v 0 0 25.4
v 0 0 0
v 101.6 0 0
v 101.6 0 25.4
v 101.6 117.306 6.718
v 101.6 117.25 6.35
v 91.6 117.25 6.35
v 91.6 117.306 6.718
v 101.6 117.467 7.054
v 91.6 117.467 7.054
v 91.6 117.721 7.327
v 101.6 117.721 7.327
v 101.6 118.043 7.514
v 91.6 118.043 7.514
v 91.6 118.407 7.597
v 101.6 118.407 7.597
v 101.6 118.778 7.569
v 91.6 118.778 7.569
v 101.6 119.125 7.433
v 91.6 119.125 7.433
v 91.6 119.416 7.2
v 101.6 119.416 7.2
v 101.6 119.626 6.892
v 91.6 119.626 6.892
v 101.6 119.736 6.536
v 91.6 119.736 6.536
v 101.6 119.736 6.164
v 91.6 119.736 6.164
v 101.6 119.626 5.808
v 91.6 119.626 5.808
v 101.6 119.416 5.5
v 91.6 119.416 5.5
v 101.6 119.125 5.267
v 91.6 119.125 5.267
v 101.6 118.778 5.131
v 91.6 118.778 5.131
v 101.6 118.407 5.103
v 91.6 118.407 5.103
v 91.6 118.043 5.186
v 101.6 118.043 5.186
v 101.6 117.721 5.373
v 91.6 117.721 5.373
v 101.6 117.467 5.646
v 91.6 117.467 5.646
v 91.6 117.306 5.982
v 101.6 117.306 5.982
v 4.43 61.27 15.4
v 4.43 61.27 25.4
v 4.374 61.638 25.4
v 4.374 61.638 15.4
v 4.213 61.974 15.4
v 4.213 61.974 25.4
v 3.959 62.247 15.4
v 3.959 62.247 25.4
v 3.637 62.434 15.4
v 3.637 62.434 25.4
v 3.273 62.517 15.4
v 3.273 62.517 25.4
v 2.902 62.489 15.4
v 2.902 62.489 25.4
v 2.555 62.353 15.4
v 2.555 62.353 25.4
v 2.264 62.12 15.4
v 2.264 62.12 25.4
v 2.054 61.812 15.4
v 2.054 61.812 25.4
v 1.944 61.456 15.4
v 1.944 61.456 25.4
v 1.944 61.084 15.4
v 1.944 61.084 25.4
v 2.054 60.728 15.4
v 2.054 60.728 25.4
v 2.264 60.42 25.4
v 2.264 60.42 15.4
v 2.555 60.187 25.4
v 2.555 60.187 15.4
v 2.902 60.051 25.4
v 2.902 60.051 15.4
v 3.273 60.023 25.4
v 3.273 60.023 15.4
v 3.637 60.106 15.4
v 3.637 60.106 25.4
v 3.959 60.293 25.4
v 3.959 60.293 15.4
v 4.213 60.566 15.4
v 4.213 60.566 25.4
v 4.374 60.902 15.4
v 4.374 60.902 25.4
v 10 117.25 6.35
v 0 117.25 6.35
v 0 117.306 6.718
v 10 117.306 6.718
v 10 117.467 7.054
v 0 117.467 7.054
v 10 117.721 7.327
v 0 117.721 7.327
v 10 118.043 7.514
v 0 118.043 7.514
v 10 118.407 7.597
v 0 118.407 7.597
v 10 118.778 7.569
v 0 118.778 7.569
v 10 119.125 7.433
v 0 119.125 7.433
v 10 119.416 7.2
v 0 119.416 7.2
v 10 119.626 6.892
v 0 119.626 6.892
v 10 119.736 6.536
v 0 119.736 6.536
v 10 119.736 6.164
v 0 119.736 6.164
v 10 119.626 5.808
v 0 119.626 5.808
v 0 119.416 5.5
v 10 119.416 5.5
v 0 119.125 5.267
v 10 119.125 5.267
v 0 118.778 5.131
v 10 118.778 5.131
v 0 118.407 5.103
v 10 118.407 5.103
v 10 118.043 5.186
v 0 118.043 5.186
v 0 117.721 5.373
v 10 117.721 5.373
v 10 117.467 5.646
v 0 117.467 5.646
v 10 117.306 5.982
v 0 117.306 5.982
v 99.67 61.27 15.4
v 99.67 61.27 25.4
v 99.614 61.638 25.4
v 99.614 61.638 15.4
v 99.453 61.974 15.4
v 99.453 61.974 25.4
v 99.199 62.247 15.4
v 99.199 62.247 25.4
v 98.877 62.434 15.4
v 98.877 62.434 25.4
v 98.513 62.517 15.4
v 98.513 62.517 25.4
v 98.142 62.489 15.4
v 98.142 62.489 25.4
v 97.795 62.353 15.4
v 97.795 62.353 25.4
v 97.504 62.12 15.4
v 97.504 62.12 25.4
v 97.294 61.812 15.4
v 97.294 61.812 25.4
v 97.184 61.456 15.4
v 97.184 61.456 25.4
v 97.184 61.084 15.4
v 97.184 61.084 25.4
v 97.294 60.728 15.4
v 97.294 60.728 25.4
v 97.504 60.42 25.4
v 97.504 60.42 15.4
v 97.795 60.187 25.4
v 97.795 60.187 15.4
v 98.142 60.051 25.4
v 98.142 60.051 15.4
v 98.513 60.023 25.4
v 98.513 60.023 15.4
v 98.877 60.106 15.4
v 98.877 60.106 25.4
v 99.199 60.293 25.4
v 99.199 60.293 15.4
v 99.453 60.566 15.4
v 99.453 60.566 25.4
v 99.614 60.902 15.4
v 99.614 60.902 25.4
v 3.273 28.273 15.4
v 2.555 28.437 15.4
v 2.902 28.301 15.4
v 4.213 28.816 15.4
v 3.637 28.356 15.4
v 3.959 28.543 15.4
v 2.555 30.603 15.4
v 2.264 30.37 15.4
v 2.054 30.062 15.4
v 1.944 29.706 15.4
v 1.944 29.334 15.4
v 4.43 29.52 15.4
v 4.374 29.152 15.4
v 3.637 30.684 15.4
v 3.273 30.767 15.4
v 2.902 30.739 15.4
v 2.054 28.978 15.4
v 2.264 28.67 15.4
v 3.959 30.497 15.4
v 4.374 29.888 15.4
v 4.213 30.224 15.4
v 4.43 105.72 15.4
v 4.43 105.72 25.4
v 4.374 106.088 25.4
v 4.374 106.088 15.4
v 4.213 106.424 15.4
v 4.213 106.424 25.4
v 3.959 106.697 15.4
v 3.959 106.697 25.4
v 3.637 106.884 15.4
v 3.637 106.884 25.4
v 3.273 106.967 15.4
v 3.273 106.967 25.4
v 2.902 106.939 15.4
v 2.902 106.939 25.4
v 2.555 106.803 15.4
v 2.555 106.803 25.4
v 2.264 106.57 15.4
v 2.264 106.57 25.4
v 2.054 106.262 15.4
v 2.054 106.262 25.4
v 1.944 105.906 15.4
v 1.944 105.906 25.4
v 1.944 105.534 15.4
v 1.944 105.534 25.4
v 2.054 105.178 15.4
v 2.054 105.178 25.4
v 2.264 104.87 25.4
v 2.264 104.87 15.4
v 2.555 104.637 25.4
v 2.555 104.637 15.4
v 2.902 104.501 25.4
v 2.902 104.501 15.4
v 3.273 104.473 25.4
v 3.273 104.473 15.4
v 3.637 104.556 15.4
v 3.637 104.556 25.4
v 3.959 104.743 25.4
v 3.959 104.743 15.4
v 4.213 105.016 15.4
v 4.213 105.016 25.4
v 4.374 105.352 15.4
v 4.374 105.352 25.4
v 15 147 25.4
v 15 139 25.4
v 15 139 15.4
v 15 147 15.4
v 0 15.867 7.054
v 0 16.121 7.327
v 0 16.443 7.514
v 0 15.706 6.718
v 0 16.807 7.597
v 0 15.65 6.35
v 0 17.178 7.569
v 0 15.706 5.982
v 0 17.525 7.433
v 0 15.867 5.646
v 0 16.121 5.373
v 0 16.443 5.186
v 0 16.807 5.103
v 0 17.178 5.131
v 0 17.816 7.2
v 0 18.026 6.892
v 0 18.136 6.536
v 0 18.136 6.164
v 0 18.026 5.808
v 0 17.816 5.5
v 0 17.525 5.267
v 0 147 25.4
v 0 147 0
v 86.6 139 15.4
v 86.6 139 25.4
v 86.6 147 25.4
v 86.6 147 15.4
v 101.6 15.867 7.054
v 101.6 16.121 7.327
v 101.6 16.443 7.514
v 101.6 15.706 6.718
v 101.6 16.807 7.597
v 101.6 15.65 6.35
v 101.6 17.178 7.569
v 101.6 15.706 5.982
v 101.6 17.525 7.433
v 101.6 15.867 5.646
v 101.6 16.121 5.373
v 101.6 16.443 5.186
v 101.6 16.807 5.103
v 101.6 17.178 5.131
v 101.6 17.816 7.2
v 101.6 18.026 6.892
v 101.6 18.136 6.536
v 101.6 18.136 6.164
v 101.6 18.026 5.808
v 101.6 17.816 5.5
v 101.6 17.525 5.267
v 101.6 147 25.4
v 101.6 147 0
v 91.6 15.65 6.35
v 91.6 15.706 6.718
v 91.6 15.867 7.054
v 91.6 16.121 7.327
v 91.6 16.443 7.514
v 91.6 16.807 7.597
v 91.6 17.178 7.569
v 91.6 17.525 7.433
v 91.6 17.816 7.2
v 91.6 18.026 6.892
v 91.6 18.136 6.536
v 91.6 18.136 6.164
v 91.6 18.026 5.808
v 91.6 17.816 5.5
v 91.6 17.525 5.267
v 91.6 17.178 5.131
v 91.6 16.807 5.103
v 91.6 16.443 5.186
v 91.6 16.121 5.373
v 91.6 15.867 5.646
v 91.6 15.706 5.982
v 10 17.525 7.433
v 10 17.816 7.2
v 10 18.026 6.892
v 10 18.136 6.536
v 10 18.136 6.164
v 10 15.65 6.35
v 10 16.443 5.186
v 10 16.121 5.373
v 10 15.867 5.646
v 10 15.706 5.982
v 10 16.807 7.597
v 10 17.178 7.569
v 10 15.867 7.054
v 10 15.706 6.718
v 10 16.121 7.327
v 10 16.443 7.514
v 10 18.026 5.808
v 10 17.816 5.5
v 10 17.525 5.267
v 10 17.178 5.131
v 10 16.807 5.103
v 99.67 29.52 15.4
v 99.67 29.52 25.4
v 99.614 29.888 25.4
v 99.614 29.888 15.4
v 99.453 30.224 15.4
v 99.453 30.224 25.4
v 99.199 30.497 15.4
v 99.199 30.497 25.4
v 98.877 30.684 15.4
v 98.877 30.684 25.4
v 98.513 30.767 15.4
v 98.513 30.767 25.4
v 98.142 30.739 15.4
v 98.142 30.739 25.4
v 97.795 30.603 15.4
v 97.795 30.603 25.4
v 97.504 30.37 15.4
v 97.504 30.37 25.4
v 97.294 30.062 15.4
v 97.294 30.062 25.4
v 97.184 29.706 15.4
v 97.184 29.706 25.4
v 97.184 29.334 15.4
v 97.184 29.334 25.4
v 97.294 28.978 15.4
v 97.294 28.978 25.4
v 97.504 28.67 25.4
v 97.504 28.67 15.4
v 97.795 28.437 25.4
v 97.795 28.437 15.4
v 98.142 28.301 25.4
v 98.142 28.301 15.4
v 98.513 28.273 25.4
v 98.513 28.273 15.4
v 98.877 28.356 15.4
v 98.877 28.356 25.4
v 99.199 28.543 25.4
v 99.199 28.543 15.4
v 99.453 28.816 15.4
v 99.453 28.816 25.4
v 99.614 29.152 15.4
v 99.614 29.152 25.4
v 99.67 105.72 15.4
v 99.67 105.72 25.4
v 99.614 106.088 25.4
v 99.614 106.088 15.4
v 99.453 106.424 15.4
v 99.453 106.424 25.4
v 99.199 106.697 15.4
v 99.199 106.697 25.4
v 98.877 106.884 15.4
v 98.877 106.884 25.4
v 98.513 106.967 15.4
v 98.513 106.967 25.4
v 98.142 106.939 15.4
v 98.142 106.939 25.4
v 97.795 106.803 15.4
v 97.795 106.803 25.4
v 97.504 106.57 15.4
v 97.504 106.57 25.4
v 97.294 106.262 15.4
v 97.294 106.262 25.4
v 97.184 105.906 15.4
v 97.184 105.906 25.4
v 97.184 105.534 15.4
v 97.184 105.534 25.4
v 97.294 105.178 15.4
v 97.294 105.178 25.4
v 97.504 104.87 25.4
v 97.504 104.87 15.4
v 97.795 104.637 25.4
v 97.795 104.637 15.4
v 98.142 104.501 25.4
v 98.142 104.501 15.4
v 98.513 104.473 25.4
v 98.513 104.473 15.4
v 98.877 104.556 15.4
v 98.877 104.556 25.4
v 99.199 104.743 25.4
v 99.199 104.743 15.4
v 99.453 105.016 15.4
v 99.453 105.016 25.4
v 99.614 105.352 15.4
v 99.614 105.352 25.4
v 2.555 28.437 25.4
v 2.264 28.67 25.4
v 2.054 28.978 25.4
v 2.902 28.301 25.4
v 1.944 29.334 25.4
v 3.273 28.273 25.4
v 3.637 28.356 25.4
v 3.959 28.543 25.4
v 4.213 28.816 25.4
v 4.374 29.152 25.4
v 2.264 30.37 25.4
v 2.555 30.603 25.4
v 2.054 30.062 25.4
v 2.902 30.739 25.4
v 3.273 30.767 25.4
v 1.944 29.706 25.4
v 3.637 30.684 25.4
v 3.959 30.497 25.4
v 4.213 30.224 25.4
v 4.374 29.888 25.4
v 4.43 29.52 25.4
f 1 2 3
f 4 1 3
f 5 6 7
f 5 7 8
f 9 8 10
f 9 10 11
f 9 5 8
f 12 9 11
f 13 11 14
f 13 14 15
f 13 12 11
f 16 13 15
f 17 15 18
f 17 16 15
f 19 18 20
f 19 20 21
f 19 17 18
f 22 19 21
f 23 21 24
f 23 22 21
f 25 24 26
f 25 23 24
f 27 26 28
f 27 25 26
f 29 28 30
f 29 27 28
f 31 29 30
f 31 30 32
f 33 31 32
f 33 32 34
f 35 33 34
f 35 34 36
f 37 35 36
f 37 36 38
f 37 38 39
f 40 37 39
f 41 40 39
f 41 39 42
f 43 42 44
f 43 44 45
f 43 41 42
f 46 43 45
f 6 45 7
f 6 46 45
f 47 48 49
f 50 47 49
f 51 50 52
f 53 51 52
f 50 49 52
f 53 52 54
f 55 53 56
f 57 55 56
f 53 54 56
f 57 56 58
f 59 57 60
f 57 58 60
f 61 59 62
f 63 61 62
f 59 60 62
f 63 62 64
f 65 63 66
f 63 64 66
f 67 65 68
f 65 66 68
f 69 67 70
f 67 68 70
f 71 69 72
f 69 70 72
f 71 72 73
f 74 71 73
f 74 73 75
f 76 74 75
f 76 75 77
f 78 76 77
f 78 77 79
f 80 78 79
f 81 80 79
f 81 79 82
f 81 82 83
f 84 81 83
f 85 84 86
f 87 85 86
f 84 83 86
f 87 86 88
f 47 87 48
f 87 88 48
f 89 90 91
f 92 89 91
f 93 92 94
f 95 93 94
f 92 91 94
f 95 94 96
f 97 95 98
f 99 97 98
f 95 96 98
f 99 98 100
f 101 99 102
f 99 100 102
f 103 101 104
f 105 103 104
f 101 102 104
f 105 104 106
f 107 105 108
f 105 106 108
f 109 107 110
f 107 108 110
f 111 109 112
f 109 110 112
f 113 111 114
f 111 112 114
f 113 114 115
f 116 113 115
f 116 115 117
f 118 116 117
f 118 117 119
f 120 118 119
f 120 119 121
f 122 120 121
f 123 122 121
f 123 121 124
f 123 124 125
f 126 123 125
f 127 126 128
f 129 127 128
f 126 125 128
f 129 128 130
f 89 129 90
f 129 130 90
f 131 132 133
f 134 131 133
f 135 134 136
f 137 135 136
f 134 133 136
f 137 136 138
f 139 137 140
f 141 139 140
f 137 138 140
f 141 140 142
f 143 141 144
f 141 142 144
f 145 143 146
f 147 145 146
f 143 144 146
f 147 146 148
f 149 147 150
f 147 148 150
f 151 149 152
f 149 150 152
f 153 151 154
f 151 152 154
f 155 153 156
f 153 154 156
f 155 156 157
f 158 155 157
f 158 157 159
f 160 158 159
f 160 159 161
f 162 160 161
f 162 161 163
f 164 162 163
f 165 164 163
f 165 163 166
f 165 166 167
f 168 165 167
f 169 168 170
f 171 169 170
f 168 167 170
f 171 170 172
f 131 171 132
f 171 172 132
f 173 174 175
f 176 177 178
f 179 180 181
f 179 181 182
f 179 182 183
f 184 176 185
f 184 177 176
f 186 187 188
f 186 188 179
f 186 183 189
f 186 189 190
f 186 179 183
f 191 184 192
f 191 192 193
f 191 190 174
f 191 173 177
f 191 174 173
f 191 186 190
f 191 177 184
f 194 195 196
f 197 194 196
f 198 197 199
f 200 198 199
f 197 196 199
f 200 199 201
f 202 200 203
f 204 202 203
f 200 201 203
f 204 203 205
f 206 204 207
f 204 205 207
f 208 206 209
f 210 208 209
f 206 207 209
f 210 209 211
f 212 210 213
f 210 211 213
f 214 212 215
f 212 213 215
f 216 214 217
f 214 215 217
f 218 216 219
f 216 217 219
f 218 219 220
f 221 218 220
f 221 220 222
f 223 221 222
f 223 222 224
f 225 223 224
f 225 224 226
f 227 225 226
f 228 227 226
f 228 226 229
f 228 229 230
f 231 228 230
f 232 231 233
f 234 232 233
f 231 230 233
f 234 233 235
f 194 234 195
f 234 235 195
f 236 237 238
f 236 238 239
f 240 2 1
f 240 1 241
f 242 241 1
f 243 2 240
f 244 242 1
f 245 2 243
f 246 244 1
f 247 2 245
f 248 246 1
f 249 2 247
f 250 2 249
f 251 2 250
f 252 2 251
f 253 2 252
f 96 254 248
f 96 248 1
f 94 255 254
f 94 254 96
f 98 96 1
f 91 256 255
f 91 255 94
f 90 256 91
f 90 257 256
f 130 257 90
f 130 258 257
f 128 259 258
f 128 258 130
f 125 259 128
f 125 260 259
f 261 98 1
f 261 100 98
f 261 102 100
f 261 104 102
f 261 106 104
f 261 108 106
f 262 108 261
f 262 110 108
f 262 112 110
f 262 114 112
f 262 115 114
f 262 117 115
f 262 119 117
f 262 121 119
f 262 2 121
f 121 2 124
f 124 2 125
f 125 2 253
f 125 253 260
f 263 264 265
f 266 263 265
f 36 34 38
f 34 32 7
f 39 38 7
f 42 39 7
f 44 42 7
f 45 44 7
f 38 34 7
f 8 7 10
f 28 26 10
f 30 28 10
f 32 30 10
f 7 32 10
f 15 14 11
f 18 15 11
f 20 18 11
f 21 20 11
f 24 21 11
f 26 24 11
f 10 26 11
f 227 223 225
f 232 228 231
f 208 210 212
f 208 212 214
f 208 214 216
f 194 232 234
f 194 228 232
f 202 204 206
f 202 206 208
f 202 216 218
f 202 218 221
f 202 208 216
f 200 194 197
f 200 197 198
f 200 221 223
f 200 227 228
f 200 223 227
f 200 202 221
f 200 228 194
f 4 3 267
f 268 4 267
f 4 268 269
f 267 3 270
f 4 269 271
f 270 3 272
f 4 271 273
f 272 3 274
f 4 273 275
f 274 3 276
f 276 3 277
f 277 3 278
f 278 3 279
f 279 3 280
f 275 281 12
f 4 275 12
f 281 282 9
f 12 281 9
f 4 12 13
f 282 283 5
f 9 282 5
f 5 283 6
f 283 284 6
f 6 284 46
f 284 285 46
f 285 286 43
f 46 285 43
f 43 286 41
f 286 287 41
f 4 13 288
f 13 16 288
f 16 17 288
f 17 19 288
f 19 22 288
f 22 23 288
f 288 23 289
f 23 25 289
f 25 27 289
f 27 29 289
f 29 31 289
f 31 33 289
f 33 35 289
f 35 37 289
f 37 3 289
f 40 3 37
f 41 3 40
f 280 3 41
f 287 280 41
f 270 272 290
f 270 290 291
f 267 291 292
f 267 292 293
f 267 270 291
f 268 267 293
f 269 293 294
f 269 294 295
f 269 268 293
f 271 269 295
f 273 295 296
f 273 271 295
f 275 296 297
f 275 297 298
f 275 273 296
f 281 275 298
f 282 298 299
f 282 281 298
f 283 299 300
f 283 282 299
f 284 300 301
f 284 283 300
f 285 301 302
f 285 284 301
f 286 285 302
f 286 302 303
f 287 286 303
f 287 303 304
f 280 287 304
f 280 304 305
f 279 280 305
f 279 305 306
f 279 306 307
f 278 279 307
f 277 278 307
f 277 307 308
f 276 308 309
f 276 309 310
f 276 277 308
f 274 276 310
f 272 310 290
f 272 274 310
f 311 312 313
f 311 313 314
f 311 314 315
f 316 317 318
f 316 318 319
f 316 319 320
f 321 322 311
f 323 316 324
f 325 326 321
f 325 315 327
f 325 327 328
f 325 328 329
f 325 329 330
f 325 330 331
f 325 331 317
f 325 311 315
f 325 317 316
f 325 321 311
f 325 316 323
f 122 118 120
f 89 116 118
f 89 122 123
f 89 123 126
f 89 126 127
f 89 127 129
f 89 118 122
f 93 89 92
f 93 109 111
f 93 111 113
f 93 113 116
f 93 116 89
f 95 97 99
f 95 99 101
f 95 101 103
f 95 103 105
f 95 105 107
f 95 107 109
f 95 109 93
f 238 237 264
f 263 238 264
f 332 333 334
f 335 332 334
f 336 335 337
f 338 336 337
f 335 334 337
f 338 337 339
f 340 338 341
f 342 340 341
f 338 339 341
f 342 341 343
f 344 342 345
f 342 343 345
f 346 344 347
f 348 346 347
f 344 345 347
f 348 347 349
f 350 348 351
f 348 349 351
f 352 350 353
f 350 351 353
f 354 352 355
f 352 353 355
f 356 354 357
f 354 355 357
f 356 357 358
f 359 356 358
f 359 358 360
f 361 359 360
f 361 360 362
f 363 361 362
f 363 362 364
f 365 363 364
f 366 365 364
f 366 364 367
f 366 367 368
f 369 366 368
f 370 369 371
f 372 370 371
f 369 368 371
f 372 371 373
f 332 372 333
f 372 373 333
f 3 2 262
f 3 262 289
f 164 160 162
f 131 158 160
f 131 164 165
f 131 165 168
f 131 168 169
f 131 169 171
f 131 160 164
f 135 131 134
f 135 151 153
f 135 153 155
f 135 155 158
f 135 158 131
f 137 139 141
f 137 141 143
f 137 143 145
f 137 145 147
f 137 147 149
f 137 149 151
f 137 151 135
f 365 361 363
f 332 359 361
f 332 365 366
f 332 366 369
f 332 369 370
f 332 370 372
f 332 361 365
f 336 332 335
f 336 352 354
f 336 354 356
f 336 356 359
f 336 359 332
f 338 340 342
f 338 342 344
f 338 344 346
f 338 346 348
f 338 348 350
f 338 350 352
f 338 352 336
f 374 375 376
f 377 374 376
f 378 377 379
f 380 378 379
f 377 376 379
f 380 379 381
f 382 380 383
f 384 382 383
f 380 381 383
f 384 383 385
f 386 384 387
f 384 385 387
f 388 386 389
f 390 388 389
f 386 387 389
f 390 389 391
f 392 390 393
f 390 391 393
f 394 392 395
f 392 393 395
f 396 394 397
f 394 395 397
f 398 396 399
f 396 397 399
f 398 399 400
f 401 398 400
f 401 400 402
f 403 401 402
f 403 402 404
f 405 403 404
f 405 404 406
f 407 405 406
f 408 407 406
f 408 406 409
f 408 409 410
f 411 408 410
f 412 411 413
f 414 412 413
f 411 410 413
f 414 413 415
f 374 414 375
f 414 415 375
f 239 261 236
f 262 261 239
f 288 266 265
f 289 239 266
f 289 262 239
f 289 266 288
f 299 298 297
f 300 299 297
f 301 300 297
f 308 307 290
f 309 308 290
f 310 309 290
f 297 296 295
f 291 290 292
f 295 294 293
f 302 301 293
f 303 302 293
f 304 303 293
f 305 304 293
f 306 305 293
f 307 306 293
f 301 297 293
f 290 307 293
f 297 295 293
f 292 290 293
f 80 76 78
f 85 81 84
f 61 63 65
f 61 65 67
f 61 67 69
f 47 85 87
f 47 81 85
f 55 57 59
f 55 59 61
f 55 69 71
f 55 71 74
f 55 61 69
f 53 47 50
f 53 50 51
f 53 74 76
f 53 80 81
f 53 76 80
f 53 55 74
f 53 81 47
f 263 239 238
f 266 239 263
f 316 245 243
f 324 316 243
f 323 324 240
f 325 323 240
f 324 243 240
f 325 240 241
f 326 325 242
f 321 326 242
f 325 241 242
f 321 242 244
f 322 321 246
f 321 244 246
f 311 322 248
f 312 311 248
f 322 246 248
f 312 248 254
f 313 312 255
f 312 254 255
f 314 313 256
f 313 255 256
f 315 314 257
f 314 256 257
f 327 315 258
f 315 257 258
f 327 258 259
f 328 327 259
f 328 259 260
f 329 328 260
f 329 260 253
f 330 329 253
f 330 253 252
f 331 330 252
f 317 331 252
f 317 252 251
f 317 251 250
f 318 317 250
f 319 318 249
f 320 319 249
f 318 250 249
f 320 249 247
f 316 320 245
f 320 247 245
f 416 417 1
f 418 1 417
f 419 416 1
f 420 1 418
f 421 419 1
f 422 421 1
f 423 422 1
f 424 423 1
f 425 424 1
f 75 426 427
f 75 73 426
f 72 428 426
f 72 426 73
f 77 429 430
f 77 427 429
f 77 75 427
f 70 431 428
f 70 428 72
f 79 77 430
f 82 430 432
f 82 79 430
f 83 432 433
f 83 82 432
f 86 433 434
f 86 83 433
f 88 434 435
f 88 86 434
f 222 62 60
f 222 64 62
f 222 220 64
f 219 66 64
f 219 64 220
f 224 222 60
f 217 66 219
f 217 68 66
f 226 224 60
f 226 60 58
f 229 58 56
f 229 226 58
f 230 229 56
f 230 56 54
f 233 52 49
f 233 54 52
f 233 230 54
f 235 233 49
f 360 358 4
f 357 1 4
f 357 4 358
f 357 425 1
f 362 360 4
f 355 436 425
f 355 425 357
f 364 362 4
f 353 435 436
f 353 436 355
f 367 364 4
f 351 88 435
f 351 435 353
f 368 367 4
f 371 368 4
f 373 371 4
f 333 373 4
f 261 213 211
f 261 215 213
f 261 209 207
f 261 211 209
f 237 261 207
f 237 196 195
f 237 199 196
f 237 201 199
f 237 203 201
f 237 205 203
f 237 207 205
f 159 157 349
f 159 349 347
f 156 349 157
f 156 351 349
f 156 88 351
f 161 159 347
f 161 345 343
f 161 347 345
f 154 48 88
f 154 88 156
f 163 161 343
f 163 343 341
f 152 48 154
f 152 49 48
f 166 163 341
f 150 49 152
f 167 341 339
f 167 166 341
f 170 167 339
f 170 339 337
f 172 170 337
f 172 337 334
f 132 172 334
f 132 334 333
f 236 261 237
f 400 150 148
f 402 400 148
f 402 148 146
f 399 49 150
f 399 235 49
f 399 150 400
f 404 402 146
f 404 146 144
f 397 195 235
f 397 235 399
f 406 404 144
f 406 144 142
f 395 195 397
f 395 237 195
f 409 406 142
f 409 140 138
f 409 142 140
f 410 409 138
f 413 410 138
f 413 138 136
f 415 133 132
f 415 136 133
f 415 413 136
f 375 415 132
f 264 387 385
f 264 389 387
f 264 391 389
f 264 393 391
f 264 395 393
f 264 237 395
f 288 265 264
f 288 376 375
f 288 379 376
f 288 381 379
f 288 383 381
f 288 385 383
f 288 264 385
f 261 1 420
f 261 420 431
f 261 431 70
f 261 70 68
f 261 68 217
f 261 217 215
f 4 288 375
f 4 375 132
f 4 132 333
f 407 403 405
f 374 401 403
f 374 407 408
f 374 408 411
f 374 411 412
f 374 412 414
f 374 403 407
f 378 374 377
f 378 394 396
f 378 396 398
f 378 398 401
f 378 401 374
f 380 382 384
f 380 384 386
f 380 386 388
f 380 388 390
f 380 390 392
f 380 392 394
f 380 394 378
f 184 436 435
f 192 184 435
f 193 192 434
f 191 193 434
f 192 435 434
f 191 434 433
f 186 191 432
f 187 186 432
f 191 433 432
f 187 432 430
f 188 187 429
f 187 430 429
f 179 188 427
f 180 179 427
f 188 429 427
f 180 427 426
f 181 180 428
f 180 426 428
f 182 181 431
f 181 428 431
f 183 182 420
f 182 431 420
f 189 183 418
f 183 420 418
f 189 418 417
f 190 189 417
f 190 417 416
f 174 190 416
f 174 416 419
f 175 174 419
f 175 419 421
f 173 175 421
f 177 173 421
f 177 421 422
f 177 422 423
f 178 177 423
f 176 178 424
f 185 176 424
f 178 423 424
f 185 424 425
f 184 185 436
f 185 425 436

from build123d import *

# Parameters (mm, degrees)
F0_W     = 101.6
F0_H     = 147
F1_DEPTH = 25.4
F2_R     = 1.25
F2_W     = 71.6
F2_H     = 8
F3_DEPTH = 10
F4_R     = 1.25
F5_DEPTH = 10


# Not quite as in the source:
# - a pattern or mirror of a feature is missing from the dataset's text; its kind, count and spacing are read off the source's solid


with BuildPart() as f1:
    # F0 (on Top) → F1 (new body)
    with BuildSketch(Plane.XY):
        with Locations((50.8, 73.5)):
            Rectangle(F0_W, F0_H)
    extrude(amount=F1_DEPTH)

    # F2 (on face) → F3 (cut)
    with BuildSketch(Plane.XY.offset(25.4)):
        with Locations((3.18, 29.52)):
            Circle(F2_R)
        with Locations((3.18, 61.27)):
            Circle(F2_R)
        with Locations((3.18, 105.72)):
            Circle(F2_R)
        with Locations((98.42, 29.52)):
            Circle(F2_R)
        with Locations((98.42, 61.27)):
            Circle(F2_R)
        with Locations((98.42, 105.72)):
            Circle(F2_R)
        with Locations((50.8, 143)):
            Rectangle(F2_W, F2_H)
    extrude(amount=-F3_DEPTH, mode=Mode.SUBTRACT)

    # F4 (on face) → F5 (cut)
    with BuildSketch(Plane(origin=(0, 0, 0), x_dir=(0, -1, 0), z_dir=(-1, 0, 0))):
        with Locations((-118.5, 6.35)):
            Circle(F4_R)
        with Locations((-16.9, 6.35)):
            Circle(F4_R)
    f5 = extrude(amount=-F5_DEPTH, mode=Mode.SUBTRACT)

    # F5_copies: F5 across plane
    add(f5.mirror(Plane(origin=(50.8, 0, 0), x_dir=(0, 0, 1), z_dir=(1, 0, 0))), mode=Mode.SUBTRACT)


solid = f1.part
